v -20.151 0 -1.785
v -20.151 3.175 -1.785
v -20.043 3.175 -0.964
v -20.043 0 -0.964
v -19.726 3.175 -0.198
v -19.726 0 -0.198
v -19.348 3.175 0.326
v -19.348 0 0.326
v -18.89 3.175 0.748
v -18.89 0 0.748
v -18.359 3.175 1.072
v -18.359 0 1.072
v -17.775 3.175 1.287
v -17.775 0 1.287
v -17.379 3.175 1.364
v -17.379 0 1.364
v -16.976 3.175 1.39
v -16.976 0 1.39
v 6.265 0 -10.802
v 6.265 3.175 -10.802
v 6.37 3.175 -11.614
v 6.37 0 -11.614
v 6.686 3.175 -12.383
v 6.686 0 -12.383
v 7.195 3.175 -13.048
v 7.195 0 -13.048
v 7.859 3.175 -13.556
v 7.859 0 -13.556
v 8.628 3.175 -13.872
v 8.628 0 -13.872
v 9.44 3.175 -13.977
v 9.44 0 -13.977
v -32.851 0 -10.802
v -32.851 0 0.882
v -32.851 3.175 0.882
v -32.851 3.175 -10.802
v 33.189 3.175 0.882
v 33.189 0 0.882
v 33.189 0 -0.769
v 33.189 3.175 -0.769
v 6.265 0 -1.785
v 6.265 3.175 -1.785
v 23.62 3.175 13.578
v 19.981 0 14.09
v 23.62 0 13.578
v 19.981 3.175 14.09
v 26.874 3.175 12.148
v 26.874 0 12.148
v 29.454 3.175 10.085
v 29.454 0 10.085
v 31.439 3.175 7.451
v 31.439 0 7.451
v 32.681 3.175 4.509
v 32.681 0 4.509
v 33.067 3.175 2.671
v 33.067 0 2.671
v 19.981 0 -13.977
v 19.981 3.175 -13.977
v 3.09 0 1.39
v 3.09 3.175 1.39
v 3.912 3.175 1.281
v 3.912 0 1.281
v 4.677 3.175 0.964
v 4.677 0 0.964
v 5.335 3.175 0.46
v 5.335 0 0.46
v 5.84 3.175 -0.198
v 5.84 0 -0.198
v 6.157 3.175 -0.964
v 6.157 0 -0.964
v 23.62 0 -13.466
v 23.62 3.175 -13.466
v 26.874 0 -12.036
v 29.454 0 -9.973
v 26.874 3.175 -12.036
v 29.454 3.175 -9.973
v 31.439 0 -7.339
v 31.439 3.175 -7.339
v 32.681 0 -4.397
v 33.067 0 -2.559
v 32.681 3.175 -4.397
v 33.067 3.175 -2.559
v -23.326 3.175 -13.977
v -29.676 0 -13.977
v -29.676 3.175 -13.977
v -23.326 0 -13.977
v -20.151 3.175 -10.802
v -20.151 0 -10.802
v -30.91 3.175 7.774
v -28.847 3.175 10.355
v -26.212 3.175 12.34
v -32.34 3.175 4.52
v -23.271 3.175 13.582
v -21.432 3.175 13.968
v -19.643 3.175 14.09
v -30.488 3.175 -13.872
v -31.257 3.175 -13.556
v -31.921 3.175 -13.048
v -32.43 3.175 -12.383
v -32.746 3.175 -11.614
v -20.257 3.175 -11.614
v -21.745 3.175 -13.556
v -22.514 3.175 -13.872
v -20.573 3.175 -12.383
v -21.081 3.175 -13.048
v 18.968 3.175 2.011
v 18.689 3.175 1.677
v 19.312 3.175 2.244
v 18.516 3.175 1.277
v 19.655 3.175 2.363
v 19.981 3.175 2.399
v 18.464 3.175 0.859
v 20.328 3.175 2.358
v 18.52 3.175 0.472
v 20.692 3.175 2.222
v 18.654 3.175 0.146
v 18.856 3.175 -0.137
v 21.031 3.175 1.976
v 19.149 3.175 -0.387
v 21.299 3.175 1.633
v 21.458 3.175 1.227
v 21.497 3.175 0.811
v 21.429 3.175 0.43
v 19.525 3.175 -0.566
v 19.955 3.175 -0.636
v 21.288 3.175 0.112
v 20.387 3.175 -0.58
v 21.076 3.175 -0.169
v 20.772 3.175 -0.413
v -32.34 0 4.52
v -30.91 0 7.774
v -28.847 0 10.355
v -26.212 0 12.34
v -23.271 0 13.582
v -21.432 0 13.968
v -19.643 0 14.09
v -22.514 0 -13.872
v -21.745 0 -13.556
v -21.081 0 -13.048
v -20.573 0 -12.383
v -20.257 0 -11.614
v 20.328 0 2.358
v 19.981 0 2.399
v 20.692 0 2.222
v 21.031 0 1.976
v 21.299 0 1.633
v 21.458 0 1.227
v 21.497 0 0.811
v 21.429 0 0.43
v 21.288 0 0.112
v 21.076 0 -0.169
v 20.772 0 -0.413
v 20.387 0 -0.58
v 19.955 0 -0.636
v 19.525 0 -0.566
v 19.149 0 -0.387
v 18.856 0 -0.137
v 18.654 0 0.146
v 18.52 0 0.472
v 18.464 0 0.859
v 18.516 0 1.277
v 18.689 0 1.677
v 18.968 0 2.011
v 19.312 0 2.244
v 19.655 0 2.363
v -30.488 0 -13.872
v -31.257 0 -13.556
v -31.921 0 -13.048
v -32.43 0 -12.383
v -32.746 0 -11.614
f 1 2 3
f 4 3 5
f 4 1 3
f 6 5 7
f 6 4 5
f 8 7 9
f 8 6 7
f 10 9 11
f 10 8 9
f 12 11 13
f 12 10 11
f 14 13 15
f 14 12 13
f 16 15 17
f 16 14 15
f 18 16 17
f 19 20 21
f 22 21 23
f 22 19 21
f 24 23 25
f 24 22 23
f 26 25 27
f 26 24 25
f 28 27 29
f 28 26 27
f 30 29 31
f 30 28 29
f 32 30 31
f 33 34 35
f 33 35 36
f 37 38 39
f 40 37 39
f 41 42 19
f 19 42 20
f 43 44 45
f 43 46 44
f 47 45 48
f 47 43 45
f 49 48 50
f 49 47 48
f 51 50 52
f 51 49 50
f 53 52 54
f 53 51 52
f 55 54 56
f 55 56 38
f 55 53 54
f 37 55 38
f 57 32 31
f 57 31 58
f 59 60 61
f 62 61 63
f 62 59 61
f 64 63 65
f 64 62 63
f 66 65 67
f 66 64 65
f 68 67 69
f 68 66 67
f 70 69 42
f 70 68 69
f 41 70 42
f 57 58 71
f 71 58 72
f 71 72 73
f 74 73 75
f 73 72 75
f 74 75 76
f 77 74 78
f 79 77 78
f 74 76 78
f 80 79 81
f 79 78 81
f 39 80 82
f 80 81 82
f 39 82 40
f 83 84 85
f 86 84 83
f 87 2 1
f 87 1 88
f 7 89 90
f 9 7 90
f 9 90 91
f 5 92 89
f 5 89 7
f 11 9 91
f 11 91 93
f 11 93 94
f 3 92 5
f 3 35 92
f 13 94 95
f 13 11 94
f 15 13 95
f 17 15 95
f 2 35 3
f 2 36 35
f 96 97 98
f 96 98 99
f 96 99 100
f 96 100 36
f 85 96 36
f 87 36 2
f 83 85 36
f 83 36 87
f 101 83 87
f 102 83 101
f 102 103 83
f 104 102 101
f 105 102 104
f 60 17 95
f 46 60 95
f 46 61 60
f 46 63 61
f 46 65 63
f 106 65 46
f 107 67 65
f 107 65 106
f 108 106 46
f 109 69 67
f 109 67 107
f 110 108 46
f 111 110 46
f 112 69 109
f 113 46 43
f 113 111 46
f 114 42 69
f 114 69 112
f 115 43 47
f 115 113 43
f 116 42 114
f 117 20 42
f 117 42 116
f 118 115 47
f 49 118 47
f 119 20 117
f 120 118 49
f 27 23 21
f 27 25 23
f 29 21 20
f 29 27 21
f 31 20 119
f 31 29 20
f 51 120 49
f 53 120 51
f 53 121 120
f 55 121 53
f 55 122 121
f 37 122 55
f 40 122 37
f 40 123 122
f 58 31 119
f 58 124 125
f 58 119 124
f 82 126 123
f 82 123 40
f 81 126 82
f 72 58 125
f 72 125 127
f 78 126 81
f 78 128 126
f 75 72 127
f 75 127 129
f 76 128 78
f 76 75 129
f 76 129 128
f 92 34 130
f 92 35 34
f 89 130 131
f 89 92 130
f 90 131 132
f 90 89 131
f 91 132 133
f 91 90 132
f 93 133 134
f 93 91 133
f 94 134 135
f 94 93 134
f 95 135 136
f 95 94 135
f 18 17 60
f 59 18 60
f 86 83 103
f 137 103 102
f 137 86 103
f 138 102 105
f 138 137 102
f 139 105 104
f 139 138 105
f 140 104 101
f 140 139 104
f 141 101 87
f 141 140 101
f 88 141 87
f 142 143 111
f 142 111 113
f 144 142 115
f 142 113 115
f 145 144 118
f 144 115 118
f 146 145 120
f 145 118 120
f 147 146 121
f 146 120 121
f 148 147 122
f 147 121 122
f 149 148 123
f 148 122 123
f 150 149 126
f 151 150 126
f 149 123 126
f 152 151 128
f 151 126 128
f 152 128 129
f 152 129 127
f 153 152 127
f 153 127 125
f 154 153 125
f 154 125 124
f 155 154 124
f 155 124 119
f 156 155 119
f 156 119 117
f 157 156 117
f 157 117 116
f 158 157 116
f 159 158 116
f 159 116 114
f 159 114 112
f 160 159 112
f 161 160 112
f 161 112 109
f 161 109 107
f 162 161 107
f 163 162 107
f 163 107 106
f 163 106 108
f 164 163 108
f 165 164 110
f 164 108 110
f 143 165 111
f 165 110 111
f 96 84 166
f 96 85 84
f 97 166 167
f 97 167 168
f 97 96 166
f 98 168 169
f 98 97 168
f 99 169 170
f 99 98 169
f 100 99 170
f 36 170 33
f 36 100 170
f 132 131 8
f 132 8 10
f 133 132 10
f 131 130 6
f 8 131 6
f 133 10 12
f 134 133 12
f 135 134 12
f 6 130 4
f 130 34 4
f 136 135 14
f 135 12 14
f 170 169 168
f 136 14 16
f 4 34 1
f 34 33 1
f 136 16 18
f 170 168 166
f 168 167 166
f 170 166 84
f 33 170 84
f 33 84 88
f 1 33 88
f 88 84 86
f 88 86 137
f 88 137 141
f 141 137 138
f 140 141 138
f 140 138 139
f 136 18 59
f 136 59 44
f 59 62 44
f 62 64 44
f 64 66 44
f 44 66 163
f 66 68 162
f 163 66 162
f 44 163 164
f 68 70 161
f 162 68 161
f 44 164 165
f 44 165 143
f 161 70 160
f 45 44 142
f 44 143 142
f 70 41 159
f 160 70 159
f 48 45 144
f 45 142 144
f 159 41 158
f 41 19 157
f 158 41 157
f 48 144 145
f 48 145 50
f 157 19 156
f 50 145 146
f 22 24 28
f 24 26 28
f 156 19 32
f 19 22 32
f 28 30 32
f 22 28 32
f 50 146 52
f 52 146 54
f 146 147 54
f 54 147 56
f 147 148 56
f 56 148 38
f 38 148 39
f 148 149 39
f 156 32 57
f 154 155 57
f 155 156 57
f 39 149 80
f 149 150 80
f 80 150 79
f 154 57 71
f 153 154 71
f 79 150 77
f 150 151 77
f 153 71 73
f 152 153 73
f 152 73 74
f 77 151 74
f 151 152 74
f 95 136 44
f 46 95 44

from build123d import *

# Parameters (mm, degrees)
SKETCH1_W           = 50.8
SKETCH1_H           = 21.59
BOSS_EXTRUDE1_DEPTH = 3.175
FILLET1_R           = 10.16
SKETCH3_R           = 1.16713
CUT_EXTRUDE1_DEPTH  = 28.780796425
FILLET3_R           = 10.16
SCALE1_SCALE_X      = 1.3
SCALE1_SCALE_Y      = 1
SCALE1_SCALE_Z      = 1.3
SKETCH4_W           = 26.416
SKETCH4_H           = 15.367
CUT_EXTRUDE2_DEPTH  = 37.195267212
FILLET4_R           = 3.175


with BuildPart() as part:
    # Sketch1 → Boss-Extrude1 (new body)
    with BuildSketch(Plane(origin=(0, 0, 0), x_dir=(1, 0, 0), z_dir=(0, 1, 0))):
        Rectangle(SKETCH1_W, SKETCH1_H)
    extrude(amount=BOSS_EXTRUDE1_DEPTH)

    # Fillet1
    fillet1_edges = [part.edges().sort_by_distance(p)[0] for p in [
        (25.4, 1.5875, 10.795),
        (-25.4, 1.5875, 10.795),
    ]]
    fillet(fillet1_edges, radius=FILLET1_R)

    # Sketch3 → Cut-Extrude1 (cut, through all)
    with BuildSketch(Plane(origin=(0, 3.175, 0), x_dir=(1, 0, 0), z_dir=(0, 1, 0))):
        with Locations(Location((15.24, -0.635, 0), (0, 0, 270))):
            Circle(SKETCH3_R)
    extrude(amount=-CUT_EXTRUDE1_DEPTH, mode=Mode.SUBTRACT)

    # Fillet3
    fillet3_edges = [part.edges().sort_by_distance(p)[0] for p in [
        (25.4, 1.5875, -10.795),
    ]]
    fillet(fillet3_edges, radius=FILLET3_R)


with BuildPart() as part_1:
    # Scale1: scaled about (-0.562959999, 1.5875, -0.186718305)
    add(part.part.scale((SCALE1_SCALE_X, SCALE1_SCALE_Y, SCALE1_SCALE_Z), about=(-0.562959999, 1.5875, -0.186718305)))

    # Sketch4 → Cut-Extrude2 (cut, through all)
    with BuildSketch(Plane(origin=(0, 3.175, 0), x_dir=(1, 0, 0), z_dir=(0, 1, 0))):
        with Locations((-6.943112, 6.293984509)):
            Rectangle(SKETCH4_W, SKETCH4_H)
    extrude(amount=-CUT_EXTRUDE2_DEPTH, mode=Mode.SUBTRACT)

    # Fillet4
    fillet4_edges = [part_1.edges().sort_by_distance(p)[0] for p in [
        (6.264888, 1.5875, -13.977484509),
        (6.264888, 1.5875, 1.389515491),
        (-20.151112, 1.5875, 1.389515491),
        (-20.151112, 1.5875, -13.977484509),
        (-32.851112, 1.5875, -13.977484508),
    ]]
    fillet(fillet4_edges, radius=FILLET4_R)


solid = part_1.part
